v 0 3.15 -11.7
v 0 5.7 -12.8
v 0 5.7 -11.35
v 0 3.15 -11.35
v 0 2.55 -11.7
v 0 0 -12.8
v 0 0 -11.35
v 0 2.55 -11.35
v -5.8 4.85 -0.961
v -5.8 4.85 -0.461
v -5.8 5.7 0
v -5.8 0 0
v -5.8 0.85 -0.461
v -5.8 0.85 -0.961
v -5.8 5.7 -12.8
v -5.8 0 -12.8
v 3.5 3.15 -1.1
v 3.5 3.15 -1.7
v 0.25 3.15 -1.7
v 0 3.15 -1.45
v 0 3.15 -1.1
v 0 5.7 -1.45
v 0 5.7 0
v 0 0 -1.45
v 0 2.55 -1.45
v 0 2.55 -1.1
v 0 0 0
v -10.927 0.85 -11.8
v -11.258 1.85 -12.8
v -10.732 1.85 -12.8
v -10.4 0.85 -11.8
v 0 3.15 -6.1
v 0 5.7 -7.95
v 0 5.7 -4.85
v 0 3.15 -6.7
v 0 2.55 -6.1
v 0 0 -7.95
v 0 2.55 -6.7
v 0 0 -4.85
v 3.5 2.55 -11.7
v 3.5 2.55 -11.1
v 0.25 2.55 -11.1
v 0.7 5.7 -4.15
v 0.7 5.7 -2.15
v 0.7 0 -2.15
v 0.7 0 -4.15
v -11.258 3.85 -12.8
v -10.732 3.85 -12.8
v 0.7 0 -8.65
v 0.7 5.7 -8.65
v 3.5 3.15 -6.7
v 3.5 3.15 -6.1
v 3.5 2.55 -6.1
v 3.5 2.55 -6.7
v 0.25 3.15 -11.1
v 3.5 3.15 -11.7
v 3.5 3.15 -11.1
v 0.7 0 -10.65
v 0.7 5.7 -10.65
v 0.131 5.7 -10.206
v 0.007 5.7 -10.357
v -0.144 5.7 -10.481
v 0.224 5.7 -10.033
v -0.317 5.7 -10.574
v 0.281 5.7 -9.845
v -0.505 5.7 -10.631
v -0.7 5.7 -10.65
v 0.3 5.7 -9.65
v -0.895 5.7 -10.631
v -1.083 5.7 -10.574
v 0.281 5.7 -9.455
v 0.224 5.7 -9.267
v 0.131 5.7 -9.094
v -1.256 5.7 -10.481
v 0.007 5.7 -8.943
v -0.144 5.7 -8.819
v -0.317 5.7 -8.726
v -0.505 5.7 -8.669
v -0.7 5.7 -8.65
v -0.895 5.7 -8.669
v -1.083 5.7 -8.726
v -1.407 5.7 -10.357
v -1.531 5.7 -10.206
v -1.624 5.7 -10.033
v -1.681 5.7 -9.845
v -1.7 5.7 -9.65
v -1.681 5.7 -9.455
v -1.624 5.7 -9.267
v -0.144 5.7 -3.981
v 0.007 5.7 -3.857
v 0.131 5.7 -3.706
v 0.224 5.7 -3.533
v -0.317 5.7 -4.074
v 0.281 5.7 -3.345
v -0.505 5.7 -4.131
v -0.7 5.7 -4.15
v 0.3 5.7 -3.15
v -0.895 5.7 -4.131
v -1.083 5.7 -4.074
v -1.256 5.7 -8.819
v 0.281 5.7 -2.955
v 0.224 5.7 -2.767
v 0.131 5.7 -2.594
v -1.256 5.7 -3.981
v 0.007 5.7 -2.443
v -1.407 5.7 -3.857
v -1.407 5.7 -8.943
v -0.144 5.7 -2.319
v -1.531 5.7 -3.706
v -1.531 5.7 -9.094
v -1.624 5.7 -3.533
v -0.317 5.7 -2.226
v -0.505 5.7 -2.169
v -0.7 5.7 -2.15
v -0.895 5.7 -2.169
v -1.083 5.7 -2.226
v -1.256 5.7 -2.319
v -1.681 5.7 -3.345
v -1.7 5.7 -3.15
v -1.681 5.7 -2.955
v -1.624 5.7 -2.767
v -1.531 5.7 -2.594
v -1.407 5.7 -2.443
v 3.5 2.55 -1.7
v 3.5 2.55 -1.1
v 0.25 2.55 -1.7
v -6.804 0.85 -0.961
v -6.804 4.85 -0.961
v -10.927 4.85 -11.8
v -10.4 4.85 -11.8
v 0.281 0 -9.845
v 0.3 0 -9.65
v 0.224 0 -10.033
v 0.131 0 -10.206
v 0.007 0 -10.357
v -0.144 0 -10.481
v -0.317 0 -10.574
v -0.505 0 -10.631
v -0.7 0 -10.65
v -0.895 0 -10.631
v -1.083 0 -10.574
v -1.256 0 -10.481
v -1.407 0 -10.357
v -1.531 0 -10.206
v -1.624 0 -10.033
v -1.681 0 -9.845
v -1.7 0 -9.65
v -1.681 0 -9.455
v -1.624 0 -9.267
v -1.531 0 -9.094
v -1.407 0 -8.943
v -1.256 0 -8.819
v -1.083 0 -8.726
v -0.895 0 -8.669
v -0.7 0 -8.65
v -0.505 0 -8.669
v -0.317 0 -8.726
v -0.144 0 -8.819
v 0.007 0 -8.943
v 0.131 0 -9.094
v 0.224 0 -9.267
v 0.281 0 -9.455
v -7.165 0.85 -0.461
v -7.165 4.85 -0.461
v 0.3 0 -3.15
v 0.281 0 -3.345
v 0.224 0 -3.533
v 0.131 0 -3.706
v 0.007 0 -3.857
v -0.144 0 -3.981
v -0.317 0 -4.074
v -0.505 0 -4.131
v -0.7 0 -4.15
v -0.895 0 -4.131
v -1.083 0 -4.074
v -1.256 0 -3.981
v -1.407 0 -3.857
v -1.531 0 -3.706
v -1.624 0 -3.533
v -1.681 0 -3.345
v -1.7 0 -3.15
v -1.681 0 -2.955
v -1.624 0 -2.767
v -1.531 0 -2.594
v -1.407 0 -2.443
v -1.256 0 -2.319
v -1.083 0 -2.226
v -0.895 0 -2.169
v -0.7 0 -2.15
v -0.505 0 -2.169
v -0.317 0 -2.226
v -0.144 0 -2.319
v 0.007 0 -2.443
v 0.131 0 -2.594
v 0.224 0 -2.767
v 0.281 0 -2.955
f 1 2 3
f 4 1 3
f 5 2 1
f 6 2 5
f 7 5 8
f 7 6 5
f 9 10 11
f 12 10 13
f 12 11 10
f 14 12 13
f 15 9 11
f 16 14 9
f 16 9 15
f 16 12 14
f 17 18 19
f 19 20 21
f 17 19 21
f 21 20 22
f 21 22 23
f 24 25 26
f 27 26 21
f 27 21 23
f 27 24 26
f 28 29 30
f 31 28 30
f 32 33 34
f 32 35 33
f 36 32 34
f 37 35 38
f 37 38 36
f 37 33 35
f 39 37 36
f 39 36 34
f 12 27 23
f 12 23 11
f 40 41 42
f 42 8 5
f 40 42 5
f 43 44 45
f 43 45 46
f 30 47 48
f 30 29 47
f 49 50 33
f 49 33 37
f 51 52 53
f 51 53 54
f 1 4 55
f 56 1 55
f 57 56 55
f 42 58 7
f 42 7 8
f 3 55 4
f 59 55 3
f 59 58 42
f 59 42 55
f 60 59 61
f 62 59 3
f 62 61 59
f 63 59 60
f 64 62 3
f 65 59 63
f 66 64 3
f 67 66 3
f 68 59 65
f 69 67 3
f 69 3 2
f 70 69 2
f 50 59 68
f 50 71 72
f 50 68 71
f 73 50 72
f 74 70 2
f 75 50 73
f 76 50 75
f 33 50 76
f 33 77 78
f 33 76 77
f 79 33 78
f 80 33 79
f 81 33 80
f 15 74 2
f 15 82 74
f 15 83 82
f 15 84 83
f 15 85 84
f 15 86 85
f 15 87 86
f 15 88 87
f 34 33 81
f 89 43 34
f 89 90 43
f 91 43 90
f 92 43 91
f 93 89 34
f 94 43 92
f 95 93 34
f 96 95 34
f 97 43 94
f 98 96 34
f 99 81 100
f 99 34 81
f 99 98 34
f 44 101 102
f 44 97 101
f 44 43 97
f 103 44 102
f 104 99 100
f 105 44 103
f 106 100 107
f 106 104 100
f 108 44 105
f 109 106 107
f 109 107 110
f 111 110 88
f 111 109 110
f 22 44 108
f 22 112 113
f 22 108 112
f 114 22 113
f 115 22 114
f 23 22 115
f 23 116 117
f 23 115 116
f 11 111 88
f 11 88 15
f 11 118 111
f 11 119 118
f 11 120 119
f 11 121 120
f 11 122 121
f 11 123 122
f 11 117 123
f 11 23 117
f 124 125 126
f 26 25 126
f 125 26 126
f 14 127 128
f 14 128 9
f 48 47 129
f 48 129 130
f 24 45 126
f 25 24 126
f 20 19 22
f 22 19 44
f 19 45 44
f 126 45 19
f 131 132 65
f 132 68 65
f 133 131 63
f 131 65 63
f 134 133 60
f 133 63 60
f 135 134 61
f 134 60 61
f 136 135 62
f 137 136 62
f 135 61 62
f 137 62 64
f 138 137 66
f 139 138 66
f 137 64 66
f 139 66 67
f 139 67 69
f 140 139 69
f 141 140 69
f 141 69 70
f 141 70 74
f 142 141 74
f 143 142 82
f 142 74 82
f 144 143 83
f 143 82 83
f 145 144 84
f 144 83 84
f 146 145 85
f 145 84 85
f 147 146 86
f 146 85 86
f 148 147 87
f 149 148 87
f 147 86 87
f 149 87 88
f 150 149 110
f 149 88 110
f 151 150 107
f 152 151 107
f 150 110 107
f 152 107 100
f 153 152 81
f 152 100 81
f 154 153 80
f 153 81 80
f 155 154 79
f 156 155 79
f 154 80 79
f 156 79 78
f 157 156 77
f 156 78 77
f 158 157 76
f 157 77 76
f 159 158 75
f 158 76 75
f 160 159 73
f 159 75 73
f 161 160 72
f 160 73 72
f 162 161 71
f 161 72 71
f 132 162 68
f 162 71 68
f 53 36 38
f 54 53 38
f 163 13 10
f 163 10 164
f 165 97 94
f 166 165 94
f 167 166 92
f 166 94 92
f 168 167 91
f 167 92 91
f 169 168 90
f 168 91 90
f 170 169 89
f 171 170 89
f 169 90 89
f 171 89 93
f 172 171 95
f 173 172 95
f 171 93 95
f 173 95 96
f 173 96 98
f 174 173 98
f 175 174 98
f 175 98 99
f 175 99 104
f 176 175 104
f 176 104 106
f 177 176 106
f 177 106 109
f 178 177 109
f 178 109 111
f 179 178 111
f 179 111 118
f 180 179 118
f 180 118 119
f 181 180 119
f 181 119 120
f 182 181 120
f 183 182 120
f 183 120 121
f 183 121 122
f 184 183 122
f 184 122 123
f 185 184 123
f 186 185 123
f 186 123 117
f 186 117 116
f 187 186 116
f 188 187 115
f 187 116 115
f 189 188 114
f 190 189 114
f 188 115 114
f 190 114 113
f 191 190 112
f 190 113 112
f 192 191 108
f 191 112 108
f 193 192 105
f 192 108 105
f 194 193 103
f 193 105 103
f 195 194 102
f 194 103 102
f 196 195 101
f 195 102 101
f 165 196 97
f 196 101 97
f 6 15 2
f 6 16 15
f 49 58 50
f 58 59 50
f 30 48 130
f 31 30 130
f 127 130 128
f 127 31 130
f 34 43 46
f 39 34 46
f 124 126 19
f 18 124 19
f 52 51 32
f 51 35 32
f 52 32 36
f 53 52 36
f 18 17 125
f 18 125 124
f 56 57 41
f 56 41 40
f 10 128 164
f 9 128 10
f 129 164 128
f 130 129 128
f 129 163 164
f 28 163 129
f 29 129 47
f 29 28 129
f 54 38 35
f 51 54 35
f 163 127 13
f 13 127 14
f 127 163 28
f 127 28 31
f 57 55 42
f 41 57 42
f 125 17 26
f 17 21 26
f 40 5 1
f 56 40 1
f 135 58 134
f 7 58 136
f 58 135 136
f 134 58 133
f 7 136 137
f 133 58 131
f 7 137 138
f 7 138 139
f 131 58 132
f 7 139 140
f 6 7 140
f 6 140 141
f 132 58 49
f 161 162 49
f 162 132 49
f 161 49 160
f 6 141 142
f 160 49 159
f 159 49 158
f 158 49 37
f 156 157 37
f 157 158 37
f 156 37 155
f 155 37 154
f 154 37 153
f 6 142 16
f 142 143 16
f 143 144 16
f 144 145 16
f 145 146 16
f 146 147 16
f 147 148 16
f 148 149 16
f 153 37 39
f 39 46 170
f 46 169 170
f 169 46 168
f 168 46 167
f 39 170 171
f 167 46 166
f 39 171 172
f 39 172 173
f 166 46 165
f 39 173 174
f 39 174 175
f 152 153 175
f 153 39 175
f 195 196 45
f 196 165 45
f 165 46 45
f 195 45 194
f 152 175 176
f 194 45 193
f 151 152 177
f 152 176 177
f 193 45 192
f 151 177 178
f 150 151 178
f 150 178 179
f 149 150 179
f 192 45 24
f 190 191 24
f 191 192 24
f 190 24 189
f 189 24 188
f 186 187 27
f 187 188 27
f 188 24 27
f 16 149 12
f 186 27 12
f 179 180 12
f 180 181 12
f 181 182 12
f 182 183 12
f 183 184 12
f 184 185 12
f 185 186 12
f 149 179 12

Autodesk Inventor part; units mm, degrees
ref_plane "YZ Plane" through (0, 0, 0) normal (1, 0, 0) x (0, 1, 0)
ref_plane "XZ Plane" through (0, 0, 0) normal (0, 1, 0) x (-1, 0, 0)
sketch "Sketch1" plane through (0, 0, 0) normal (0, 1, 0) x (-1, 0, 0)
  line L0 (0, 0) -> (5.8, 0)
  line L1 (5.8, 0) -> (5.8, -12.8)
  line L2 (5.8, -12.8) -> (0, -12.8)
  line L3 (0, -12.8) -> (0, 0)
  dimension "d0" = 5.8
  dimension "d1" = 12.8
extrude "Extrusion1" add sketch "Sketch1" along normal blind 5.7
sketch "Sketch2" plane through (0, 5.7, 0) normal (0, 1, 0) x (1, 0, 0)
  circle A0 centre (-1.4, 3.15) radius 1
  line L0 (-5.8, 12.8) -> (-5.8, 0) projected
  line L1 (-5.8, 6.4) -> (0, 6.4) construction
  line L2 (0, 0) -> (0, 12.8) projected
  circle A1 centre (-1.4, 9.65) radius 1
  dimension "d4" = 2
  dimension "d5" = 3.25
  dimension "d6" = 1.4
extrude "Extrusion2" [suppressed]
sketch "Sketch3" plane through (0, 5.7, 0) normal (0, 1, 0) x (1, 0, 0)
  line L0 (0, 0) -> (0, 12.8) projected
  line L1 (0, 2.15) -> (0.7, 2.15)
  line L2 (0.7, 2.15) -> (0.7, 4.15)
  line L3 (0.7, 4.15) -> (0, 4.15)
  line L4 (0, 4.15) -> (0, 2.15)
  line L5 (0, 6.4) -> (-5.8, 6.4) construction
  line L6 (-5.8, 12.8) -> (-5.8, 0) projected
  circle A0 centre (-1.4, 3.15) radius 1 projected
  line L7 (-1.4, 3.15) -> (-5.8, 3.15) construction
  line L8 (0.7, 3.15) -> (0, 3.15) construction
  line L9 (0, 10.65) -> (0.7, 10.65)
  line L10 (0.7, 10.65) -> (0.7, 8.65)
  line L11 (0.7, 8.65) -> (0, 8.65)
  line L12 (0, 8.65) -> (0, 10.65)
  line L13 (0.7, 9.65) -> (0, 9.65) construction
  point P0 (0, 8.65)
  point P1 (0, 4.15)
  dimension "d9" = 0.7
  dimension "d10" = 2
extrude "Extrusion3" add sketch "Sketch3" against normal blind 5.7 contours L0 L9 L10 L11 | L0 L3 L2 L1
chamfer "Chamfer1" distance 0.7 angle 45 4 edges at (0, 2.85, -4.15) (0, 2.85, -10.65) (0, 2.85, -8.65) (0, 2.85, -2.15)
sketch "Sketch4" plane through (0, 5.7, 0) normal (0, 1, 0) x (1, 0, 0)
  line L0 (0.7, 4.15) -> (0.7, 2.15) projected
  line L1 (0.7, 3.15) -> (-0.7, 3.15) construction
  circle A0 centre (-0.7, 3.15) radius 1
  line L2 (0, 4.85) -> (0, 7.95) projected
  line L3 (0, 6.4) -> (-5.8, 6.4) construction
  line L4 (-5.8, 12.8) -> (-5.8, 0) projected
  circle A1 centre (-0.7, 9.65) radius 1
  point P0 (0, 0)
  dimension "d16" = 2
  dimension "d17" = 1.4
extrude "Extrusion4" cut sketch "Sketch4" against normal blind 5.7
sketch "Sketch7" plane through (0, 0, -4.85) normal (1, 0, 0) x (0, 0, -1)
  line L0 (7.95, 5.7) -> (-4.85, 5.7) projected
  line L1 (1.55, 5.7) -> (1.55, 0) construction
  line L2 (1.25, 2.55) -> (1.85, 2.55)
  line L3 (1.85, 2.55) -> (1.85, 3.15)
  line L4 (1.85, 3.15) -> (1.25, 3.15)
  line L5 (1.25, 3.15) -> (1.25, 2.55)
  line L6 (1.25, 2.55) -> (1.85, 3.15) construction
  line L7 (1.85, 2.55) -> (1.25, 3.15) construction
  point P0 (-4.85, 0)
  point P1 (1.55, 2.85)
  dimension "d24" = 0.6
  dimension "d25" = 0.6
extrude "Extrusion6" add sketch "Sketch7" along normal blind 3.5
pattern_linear "Rectangular Pattern1" count 2 spacing 5 along (0, 0, -1) count 2 spacing 5 along (0, 0, 1) of "Extrusion6"
ref_plane "Work Plane1" through (0, 2.85, 0) normal (0, 1, 0) x (1, 0, 0)
sketch "Sketch8" plane through (0, 2.85, 0) normal (0, 1, 0) x (1, 0, 0)
  line L0 (-5.8, 12.8) -> (-5.8, 0) projected
  line L1 (-5.8, 0.4613) -> (-7.1649, 0.4613)
  line L2 (-7.1649, 0.4613) -> (-11.2583, 12.8)
  line L3 (-11.2583, 12.8) -> (-10.7315, 12.8)
  line L4 (-10.7315, 12.8) -> (-6.804, 0.9613)
  line L5 (-6.804, 0.9613) -> (-5.8, 0.9613)
  line L6 (0, 12.8) -> (-5.8, 12.8) projected
  point P0 (0, 0)
  dimension "d36" = 0.5
  dimension "d37" = 0.5
  dimension "d38" = 13
extrude "Extrusion7" add sketch "Sketch8" along normal mid plane 4
chamfer "Chamfer2" distance 1 angle 45 2 edges at (-10.9949, 4.85, -12.8) (-10.9949, 0.85, -12.8)
properties part number "Microswitch"
